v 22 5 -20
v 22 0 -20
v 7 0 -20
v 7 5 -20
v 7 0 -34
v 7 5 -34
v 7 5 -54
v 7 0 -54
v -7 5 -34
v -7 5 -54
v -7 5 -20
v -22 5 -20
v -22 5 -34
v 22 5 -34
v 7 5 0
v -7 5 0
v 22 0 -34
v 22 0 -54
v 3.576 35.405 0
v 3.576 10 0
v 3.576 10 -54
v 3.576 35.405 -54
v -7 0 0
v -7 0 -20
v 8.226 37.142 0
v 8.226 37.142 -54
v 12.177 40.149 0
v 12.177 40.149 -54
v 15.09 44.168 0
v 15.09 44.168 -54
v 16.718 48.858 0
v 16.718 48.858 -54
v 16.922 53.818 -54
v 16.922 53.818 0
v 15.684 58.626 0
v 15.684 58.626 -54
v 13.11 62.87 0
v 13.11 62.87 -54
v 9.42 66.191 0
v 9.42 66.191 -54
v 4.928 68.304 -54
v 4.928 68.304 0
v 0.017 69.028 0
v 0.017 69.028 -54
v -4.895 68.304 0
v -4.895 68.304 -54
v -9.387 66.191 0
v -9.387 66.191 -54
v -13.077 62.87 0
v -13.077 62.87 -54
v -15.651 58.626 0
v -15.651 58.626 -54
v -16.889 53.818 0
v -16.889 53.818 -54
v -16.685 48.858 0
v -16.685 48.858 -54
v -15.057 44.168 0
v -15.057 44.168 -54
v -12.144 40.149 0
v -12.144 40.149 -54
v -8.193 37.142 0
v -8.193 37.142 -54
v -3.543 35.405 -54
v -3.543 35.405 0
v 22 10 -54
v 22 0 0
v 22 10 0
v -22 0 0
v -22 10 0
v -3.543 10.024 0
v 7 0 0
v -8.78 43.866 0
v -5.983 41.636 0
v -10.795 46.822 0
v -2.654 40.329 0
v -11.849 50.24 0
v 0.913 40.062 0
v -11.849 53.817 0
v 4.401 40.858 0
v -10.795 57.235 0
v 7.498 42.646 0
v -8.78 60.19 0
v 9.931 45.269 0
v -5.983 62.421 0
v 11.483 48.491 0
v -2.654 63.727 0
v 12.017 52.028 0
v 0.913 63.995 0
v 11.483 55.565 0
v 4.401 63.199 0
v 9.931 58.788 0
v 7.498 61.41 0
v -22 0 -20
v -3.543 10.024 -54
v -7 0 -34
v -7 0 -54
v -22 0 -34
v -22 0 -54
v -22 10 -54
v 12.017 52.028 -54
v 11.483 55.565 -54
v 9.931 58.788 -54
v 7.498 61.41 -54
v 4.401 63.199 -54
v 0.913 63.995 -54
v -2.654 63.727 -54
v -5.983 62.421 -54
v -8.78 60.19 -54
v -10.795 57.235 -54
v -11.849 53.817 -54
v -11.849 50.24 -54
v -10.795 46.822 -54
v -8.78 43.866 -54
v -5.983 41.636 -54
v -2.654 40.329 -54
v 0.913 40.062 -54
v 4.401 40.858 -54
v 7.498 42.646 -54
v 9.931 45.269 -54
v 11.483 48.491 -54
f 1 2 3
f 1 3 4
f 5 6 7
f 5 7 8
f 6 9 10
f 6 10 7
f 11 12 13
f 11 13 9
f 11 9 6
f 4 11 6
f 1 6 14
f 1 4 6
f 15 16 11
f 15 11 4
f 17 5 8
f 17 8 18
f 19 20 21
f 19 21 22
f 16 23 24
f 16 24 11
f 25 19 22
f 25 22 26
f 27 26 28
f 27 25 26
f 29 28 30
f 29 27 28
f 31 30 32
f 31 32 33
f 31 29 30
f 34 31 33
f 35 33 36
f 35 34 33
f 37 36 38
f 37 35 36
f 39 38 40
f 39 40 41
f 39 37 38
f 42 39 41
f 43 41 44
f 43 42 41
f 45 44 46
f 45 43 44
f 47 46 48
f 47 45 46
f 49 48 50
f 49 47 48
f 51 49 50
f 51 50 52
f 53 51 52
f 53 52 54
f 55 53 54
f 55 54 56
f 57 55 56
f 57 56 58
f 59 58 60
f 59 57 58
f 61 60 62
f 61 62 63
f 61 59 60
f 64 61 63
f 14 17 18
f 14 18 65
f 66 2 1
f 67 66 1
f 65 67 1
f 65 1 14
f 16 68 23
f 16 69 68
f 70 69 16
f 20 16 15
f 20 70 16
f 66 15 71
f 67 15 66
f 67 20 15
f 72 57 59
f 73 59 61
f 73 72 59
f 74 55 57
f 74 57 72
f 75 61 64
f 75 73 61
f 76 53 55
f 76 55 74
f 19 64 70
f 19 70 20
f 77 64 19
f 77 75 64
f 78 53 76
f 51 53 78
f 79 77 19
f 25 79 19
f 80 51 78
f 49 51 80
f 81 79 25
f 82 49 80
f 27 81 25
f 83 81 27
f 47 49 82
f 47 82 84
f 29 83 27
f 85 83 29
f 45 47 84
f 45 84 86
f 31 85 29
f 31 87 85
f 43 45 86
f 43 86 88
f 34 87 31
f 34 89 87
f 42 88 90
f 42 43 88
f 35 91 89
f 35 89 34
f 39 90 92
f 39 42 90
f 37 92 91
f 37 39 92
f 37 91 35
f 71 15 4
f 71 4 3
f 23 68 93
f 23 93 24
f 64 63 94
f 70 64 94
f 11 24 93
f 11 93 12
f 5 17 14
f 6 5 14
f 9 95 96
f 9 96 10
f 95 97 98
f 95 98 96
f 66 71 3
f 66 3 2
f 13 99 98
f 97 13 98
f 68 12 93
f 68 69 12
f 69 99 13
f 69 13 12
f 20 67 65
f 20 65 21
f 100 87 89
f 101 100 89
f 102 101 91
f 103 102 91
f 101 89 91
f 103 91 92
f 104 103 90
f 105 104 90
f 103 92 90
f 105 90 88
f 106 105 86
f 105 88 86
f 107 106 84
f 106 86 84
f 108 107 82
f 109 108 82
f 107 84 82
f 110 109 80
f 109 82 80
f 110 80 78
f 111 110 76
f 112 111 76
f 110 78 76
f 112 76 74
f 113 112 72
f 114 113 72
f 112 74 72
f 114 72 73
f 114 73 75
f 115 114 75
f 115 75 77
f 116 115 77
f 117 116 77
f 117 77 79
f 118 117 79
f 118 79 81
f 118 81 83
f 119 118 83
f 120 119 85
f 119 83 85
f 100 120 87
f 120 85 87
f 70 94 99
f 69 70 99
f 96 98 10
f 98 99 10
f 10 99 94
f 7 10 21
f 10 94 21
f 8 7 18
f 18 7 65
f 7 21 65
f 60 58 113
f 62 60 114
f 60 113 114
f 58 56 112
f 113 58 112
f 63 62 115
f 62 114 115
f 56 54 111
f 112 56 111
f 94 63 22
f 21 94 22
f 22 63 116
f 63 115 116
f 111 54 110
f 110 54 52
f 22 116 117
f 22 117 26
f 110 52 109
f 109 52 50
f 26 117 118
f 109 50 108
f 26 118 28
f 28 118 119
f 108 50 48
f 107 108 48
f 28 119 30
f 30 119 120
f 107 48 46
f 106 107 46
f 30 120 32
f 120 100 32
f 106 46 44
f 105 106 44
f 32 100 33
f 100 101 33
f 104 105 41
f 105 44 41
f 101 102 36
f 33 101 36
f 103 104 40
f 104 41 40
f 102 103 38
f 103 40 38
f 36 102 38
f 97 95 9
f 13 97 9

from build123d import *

# Parameters (mm, degrees)
SKETCH1_R           = 12
BOSS_EXTRUDE1_DEPTH = 54
SKETCH2_W           = 14
SKETCH2_H           = 5
CUT_EXTRUDE1_DEPTH  = 44


with BuildPart() as part:
    # Sketch1 → Boss-Extrude1 (new body)
    with BuildSketch(Plane.XY):
        with BuildLine():
            Line((-22, 0), (-7, 0))
            Line((-7, 0), (-7, 5))
            Line((-7, 5), (7, 5))
            Line((7, 5), (7, 0))
            Line((7, 0), (22, 0))
            Line((22, 0), (22, 10))
            Line((22, 10), (3.575995422, 10))
            Line((3.575995422, 10), (3.575995422, 35.405163338))
            ThreePointArc((3.575995422, 35.405163338), (0.016529647, 69.028346048), (-3.542936129, 35.405163338))
            Line((-3.542936129, 35.405163338), (-3.542936129, 10.023734162))
            Line((-3.542936129, 10.023734162), (-22, 10))
            Line((-22, 10), (-22, 0))
        make_face()
        with Locations((0.016529647, 52.028346048)):
            Circle(SKETCH1_R, mode=Mode.SUBTRACT)
    extrude(amount=-BOSS_EXTRUDE1_DEPTH)

    # Sketch2 → Cut-Extrude1 (cut)
    with BuildSketch(Plane(origin=(22, 0, 0), x_dir=(0, 0, -1), z_dir=(1, 0, 0))):
        with Locations((27, 2.5)):
            Rectangle(SKETCH2_W, SKETCH2_H)
    extrude(amount=-CUT_EXTRUDE1_DEPTH, mode=Mode.SUBTRACT)


solid = part.part
